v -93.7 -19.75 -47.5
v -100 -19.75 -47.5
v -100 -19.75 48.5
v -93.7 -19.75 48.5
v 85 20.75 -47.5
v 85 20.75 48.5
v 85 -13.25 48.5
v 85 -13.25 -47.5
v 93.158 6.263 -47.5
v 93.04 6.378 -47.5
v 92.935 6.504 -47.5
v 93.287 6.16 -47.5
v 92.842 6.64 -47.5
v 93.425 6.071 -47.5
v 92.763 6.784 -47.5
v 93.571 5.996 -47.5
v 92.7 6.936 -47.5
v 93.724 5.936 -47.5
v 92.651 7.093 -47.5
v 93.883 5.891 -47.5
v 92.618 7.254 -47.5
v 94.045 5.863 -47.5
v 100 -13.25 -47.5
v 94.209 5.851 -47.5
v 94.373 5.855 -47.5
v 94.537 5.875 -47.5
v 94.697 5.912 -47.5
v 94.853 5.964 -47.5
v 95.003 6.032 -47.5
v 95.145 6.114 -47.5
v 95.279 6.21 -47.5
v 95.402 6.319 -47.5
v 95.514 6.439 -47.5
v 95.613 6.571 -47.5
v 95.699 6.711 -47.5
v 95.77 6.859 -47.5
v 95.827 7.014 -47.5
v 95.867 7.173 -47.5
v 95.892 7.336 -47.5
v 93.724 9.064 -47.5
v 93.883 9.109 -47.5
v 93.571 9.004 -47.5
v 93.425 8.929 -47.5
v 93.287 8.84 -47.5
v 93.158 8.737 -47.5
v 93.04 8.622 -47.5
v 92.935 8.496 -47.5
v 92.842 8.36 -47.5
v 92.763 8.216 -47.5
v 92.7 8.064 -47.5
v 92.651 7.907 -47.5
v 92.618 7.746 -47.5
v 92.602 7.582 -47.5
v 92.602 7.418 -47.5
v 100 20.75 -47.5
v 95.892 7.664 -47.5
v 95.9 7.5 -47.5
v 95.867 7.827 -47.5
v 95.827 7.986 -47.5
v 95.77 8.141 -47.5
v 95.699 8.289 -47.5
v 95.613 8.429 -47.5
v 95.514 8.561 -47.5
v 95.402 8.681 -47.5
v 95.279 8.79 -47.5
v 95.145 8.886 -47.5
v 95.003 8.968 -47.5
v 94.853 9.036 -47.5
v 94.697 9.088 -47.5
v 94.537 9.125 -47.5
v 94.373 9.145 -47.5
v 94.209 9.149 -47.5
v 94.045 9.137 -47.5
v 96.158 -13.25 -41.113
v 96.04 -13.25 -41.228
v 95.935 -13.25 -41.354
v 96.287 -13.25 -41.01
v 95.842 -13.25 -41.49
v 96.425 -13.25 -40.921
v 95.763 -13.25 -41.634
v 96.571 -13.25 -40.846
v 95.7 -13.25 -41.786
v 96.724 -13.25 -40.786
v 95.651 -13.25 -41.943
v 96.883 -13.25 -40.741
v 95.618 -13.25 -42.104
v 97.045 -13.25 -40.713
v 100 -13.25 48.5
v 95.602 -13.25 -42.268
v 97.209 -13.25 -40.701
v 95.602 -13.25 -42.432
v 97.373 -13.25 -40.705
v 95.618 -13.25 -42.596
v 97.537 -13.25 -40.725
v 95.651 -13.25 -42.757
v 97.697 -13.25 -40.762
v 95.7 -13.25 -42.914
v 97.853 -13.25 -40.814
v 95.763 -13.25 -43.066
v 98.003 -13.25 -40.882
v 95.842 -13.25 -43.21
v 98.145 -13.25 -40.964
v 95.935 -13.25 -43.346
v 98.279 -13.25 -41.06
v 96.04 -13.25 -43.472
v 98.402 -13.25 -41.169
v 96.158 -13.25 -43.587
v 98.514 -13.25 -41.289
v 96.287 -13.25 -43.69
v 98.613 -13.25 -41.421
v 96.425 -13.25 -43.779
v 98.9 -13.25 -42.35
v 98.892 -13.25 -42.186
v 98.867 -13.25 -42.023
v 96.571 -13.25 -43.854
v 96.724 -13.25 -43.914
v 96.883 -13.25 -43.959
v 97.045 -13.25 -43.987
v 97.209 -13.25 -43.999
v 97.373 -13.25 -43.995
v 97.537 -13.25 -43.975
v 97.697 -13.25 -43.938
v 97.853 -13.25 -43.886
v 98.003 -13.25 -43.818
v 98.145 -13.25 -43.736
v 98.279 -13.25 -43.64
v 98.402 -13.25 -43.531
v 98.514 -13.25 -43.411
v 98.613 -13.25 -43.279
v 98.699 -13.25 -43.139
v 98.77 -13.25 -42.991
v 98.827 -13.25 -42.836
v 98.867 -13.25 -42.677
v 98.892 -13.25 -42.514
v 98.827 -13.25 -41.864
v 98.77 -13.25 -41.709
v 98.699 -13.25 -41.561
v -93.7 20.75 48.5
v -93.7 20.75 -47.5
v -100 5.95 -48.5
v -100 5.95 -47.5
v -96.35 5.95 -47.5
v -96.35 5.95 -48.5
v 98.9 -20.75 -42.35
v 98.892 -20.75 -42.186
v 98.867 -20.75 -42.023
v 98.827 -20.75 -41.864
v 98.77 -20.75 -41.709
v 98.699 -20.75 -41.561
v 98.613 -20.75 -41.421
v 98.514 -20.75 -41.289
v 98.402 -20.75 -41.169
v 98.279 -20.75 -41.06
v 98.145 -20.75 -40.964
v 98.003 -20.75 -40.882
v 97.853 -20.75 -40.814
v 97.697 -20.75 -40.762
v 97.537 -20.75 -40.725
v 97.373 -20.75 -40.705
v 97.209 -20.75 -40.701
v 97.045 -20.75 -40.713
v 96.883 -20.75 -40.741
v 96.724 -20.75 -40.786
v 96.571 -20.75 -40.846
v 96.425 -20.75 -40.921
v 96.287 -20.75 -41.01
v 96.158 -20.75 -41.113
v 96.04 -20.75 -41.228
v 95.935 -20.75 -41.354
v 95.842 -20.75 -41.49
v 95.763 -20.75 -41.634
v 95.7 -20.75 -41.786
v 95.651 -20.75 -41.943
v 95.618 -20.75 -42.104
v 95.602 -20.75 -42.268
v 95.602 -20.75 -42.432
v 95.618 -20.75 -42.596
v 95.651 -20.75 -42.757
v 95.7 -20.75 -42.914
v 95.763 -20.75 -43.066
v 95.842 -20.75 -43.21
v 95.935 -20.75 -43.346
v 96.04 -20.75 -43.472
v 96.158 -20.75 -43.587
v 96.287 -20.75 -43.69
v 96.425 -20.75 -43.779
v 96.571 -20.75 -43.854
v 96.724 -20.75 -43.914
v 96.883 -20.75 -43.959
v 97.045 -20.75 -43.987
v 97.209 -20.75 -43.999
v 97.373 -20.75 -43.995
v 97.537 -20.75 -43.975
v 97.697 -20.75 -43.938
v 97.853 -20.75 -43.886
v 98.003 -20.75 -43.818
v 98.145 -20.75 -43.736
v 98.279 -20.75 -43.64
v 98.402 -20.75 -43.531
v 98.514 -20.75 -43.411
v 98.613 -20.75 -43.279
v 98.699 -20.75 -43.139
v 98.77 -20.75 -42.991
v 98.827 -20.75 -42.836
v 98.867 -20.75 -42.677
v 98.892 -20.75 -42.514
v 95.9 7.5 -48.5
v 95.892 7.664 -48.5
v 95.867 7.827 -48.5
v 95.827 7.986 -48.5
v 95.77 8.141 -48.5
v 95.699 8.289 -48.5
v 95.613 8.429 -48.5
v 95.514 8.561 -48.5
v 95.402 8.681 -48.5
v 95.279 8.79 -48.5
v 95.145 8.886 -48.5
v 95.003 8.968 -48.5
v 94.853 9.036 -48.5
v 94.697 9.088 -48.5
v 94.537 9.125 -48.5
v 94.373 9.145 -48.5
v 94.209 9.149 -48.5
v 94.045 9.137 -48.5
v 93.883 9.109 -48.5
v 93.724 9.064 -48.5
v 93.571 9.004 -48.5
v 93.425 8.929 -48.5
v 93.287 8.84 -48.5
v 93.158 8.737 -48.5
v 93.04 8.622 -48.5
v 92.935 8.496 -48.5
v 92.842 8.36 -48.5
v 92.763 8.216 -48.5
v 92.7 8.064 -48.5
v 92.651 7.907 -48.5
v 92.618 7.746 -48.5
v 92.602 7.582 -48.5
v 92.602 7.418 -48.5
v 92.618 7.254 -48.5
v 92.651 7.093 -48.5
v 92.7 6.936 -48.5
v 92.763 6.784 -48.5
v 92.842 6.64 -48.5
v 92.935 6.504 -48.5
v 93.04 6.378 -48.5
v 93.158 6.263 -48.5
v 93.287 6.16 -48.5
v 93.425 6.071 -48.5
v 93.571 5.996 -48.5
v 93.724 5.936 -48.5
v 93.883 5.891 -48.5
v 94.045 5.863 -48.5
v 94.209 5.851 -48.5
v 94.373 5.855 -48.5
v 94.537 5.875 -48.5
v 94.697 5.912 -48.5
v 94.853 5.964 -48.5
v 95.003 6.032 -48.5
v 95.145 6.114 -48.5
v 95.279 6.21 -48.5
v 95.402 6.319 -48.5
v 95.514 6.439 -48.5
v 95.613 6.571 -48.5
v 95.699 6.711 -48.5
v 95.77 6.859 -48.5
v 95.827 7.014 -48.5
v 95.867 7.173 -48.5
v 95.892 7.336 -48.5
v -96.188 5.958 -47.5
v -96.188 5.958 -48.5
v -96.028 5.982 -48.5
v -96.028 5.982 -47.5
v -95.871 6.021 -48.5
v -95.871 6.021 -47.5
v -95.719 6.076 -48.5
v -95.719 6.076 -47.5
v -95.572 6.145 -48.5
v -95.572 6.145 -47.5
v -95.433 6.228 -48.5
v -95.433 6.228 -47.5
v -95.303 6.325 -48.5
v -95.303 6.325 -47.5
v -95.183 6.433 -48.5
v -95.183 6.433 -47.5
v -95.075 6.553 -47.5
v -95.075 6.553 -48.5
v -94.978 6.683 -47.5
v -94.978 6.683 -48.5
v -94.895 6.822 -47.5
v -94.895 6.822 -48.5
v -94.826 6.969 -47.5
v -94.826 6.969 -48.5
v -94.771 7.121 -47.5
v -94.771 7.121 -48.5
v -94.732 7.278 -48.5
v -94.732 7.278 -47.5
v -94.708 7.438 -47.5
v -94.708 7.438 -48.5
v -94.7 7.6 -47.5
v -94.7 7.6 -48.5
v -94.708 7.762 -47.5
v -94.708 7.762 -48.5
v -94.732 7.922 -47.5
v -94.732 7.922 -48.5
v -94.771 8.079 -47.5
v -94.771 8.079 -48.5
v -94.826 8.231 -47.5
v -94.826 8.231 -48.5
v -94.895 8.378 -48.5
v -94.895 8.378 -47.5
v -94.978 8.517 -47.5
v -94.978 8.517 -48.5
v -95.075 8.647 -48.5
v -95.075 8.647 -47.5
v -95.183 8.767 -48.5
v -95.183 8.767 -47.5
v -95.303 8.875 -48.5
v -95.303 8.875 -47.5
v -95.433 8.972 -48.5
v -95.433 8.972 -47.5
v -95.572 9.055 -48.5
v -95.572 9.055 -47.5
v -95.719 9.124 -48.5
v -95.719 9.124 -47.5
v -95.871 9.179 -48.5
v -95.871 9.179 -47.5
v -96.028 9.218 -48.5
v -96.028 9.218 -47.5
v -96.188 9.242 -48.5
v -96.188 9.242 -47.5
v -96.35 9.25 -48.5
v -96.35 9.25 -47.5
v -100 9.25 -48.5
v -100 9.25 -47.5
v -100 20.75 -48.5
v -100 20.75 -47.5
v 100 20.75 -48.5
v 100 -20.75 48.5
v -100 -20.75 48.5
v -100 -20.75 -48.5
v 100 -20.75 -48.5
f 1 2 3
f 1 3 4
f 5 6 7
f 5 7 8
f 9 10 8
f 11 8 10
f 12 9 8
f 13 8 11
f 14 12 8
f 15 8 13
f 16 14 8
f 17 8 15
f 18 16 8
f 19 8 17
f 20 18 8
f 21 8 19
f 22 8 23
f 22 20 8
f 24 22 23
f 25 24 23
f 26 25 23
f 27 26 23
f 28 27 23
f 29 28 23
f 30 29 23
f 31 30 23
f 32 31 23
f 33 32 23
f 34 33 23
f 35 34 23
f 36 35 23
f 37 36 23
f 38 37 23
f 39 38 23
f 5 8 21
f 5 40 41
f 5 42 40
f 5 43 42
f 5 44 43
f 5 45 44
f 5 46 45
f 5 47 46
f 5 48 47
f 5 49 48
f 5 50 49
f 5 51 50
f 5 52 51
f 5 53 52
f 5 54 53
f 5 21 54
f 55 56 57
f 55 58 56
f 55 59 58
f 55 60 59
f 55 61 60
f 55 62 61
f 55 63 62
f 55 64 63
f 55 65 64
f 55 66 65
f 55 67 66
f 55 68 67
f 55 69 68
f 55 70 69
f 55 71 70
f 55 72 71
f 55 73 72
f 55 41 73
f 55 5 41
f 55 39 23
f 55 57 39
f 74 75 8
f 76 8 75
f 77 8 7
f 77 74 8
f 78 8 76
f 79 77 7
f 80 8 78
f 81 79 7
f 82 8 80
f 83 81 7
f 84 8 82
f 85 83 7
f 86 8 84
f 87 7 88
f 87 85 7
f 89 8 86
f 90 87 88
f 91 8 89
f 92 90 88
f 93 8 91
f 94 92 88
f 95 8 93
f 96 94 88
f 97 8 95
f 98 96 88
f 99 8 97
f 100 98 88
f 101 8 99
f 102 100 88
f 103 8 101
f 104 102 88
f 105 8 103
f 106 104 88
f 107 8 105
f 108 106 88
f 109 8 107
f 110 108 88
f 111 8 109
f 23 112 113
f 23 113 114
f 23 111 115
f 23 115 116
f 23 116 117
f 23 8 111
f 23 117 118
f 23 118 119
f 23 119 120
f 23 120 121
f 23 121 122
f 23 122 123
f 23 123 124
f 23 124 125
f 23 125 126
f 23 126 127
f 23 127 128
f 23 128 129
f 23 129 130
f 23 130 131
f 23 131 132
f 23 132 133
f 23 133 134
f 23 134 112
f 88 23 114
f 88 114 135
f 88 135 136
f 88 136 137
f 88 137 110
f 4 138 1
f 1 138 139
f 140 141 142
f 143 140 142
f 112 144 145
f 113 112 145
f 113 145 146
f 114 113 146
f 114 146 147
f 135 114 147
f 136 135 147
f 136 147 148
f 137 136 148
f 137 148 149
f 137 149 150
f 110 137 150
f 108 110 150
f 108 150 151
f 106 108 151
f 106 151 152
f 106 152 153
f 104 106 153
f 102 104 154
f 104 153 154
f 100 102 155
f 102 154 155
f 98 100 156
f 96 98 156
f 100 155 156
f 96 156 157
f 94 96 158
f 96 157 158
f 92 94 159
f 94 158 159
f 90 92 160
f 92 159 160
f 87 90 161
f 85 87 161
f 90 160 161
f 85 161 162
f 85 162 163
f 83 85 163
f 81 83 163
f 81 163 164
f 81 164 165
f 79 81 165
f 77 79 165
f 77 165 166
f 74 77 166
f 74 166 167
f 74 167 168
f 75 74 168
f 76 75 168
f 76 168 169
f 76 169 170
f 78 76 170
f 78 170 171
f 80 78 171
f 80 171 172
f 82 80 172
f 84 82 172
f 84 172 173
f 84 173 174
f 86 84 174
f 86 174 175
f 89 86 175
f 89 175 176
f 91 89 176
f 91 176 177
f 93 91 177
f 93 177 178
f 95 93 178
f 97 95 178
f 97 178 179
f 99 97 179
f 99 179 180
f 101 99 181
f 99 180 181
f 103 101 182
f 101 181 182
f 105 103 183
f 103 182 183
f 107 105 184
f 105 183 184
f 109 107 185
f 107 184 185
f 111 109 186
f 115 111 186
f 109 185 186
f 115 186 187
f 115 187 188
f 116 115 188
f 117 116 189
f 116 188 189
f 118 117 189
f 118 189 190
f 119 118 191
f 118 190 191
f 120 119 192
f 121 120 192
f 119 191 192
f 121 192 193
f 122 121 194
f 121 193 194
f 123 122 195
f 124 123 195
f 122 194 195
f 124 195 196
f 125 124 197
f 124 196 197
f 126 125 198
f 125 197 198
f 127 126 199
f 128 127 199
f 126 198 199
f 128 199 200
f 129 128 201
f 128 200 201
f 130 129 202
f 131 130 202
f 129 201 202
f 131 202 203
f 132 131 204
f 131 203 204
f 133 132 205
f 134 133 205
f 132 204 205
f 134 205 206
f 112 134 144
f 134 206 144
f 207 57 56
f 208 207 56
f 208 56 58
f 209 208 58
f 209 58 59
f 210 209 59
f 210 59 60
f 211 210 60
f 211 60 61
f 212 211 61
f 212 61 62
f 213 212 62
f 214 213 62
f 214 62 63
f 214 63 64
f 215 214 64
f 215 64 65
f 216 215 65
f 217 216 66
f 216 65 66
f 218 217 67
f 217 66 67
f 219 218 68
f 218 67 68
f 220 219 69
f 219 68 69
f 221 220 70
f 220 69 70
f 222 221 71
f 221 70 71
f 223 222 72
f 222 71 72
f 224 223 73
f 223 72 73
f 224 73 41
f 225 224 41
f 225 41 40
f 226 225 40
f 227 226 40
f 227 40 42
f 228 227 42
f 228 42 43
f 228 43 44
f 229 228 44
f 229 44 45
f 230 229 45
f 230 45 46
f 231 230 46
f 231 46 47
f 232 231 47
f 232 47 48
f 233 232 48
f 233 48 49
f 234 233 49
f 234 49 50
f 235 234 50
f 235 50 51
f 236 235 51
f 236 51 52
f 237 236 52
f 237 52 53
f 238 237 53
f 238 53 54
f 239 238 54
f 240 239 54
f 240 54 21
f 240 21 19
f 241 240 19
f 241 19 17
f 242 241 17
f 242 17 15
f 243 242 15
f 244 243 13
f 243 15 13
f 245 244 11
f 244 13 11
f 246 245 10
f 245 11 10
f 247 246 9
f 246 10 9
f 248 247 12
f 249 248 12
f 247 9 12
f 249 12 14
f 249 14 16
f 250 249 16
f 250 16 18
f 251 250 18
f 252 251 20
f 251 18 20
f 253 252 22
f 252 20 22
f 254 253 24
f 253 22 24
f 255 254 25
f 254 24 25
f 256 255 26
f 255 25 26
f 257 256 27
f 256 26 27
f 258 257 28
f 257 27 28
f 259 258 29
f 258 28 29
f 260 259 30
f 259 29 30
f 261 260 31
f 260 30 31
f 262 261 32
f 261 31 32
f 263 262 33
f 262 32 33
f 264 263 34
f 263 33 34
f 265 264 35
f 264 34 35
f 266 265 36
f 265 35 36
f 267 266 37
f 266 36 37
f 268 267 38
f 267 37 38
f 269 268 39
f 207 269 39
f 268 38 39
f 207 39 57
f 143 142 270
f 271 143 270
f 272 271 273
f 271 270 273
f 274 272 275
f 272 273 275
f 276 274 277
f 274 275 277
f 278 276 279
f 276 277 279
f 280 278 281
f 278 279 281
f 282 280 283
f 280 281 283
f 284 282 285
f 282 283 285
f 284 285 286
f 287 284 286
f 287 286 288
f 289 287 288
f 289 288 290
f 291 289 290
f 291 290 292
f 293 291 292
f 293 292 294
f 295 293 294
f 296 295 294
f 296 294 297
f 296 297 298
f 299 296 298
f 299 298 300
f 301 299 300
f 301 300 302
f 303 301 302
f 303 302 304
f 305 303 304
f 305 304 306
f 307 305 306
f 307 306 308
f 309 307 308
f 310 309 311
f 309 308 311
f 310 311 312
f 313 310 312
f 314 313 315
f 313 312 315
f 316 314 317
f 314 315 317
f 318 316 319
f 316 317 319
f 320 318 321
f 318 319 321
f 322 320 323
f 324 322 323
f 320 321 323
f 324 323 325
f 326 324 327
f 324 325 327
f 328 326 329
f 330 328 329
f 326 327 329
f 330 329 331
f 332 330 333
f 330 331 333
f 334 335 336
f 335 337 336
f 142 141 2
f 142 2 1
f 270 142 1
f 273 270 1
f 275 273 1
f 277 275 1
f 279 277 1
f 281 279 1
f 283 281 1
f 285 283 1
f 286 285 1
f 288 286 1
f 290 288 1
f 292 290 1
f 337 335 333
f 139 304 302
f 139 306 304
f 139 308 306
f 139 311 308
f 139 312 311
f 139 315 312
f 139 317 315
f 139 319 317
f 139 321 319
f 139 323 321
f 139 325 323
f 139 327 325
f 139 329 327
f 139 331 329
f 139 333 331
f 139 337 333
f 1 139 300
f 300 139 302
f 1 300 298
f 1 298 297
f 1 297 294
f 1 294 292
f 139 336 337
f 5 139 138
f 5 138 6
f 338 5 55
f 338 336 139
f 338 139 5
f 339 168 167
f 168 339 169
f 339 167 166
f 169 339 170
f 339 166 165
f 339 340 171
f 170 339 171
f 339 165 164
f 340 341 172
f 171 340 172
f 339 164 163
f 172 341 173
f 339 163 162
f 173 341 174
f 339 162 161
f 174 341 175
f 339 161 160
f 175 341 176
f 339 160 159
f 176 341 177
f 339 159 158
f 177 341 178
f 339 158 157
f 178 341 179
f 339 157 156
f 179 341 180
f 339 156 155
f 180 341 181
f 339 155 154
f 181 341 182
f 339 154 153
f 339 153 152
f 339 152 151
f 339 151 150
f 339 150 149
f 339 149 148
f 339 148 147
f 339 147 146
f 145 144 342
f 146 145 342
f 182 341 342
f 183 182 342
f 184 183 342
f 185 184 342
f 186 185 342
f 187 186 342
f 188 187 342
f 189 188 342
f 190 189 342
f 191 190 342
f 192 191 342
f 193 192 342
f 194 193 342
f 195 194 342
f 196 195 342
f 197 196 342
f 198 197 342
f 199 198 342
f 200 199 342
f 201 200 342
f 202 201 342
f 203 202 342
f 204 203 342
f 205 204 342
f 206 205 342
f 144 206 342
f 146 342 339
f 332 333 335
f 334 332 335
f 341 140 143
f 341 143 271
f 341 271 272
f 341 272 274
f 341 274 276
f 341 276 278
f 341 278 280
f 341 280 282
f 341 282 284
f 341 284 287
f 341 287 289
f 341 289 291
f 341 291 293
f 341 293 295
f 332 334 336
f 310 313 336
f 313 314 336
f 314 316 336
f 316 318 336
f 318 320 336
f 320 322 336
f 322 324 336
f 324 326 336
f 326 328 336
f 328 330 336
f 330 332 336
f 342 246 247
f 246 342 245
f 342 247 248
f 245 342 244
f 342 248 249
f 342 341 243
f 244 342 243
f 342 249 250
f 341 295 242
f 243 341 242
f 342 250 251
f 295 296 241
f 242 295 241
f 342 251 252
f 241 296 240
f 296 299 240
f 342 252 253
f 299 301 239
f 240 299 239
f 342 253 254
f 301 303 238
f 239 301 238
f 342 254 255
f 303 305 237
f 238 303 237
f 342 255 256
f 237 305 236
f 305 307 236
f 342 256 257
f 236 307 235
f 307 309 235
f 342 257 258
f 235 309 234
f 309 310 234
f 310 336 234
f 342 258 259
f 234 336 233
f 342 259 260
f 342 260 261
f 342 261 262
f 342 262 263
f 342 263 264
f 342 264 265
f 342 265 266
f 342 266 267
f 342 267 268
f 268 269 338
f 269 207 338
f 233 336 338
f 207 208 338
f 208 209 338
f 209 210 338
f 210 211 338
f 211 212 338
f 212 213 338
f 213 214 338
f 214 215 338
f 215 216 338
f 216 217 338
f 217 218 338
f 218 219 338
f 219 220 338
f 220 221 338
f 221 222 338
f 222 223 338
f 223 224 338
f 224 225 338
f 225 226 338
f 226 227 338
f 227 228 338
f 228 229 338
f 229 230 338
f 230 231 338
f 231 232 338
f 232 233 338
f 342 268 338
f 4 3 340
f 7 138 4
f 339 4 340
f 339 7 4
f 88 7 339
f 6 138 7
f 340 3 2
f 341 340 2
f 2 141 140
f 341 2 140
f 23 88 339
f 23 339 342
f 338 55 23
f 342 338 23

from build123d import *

# Parameters (mm, degrees)
SKETCH1_W           = 200
SKETCH1_H           = 97
BOSS_EXTRUDE1_DEPTH = 20.75
SKETCH2_W           = 15
SKETCH2_H           = 96
CUT_EXTRUDE1_DEPTH  = 34
SKETCH3_W           = 6.3
SKETCH3_H           = 96
CUT_EXTRUDE2_DEPTH  = 40.5
SKETCH4_R           = 1.65
CUT_EXTRUDE3_DEPTH  = 2
SKETCH5_R           = 1.65
CUT_EXTRUDE4_DEPTH  = 42.5


with BuildPart() as part:
    # Sketch1 → Boss-Extrude1 (new body, symmetric)
    with BuildSketch(Plane(origin=(0, 0, 0), x_dir=(1, 0, 0), z_dir=(0, 1, 0))):
        Rectangle(SKETCH1_W, SKETCH1_H)
    extrude(amount=BOSS_EXTRUDE1_DEPTH, both=True)

    # Sketch2 → Cut-Extrude1 (cut)
    with BuildSketch(Plane(origin=(0, 20.75, 0), x_dir=(1, 0, 0), z_dir=(0, 1, 0))):
        with Locations((92.5, -0.5)):
            Rectangle(SKETCH2_W, SKETCH2_H)
    extrude(amount=-CUT_EXTRUDE1_DEPTH, mode=Mode.SUBTRACT)

    # Sketch3 → Cut-Extrude2 (cut)
    with BuildSketch(Plane(origin=(0, 20.75, 0), x_dir=(1, 0, 0), z_dir=(0, 1, 0))):
        with Locations((-96.85, -0.5)):
            Rectangle(SKETCH3_W, SKETCH3_H)
    extrude(amount=-CUT_EXTRUDE2_DEPTH, mode=Mode.SUBTRACT)

    # Sketch4 → Cut-Extrude3 (cut, through all)
    with BuildSketch(Plane.XY.offset(-47.5)):
        with Locations((94.25, 7.5)):
            Circle(SKETCH4_R)
        with BuildLine():
            Line((-96.35, 9.25), (-100, 9.25))
            Line((-100, 9.25), (-100, 5.95))
            Line((-100, 5.95), (-96.35, 5.95))
            ThreePointArc((-96.35, 5.95), (-94.7, 7.6), (-96.35, 9.25))
        make_face()
    extrude(amount=-CUT_EXTRUDE3_DEPTH, mode=Mode.SUBTRACT)

    # Sketch5 → Cut-Extrude4 (cut, through all)
    with BuildSketch(Plane.XZ.offset(20.75)):
        with Locations((97.25, -42.35)):
            Circle(SKETCH5_R)
    extrude(amount=-CUT_EXTRUDE4_DEPTH, mode=Mode.SUBTRACT)


solid = part.part
